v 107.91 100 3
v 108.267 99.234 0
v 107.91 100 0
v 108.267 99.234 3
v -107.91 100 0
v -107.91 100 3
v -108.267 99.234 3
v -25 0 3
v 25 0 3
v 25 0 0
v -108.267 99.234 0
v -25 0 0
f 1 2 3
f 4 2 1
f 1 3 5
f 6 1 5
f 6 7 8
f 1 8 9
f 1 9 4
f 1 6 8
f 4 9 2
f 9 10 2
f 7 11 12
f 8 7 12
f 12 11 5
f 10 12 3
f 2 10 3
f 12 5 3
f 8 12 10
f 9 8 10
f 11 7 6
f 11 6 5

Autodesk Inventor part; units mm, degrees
ref_plane "YZ Plane" through (0, 0, 0) normal (1, 0, 0) x (0, 1, 0)
ref_plane "XZ Plane" through (0, 0, 0) normal (0, 1, 0) x (-1, 0, 0)
ref_plane "XY Plane" through (0, 0, 0) normal (0, 0, 1) x (1, 0, 0)
sketch "Sketch1" plane through (0, 0, 0) normal (0, 0, 1) x (1, 0, 0)
  line L0 (-108.91, 100) -> (-25, 0)
  line L1 (-25, 0) -> (25, 0)
  line L2 (25, 0) -> (108.91, 100)
  line L3 (108.91, 100) -> (-108.91, 100)
  point P0 (0, 0)
  point P1 (0, 0)
  point P2 (0, 100)
  dimension "BendRadius" = 3
  dimension "d0" = 100
  dimension "d1" = 50
  dimension "d2" = 217.8199
  dimension "d4" = 130
extrude "Plate1" add sketch "Sketch1" along normal blind 3
chamfer "Chamfer1" distance 1 angle 45 2 edges at (-108.91, 100, 1.5) (108.91, 100, 1.5)
equation "\"BendRadius\" = Thickness"
equation "\"d0\" = Лоток_высота"
equation "\"d1\" = Лоток_ширина_низ"
equation "\"d4\" = Лоток_угол"
equation "\"d3\" = Thickness"
equation "\"BendReliefWidth\" = Thickness"
equation "\"BendReliefDepth\" = 0.5 * Thickness"
equation "\"CornerReliefSize\" = 4 * Thickness"
equation "\"MinimumRemnant\" = 2 * Thickness"
equation "\"TransitionRadius\" = BendRadius"
equation "\"JacobiRadiusSize\" = BendRadius"
equation "\"GapSize\" = Thickness"
equation "\"Thickness\" = 3"
equation "\"Лоток_высота\" = 100"
equation "\"Лоток_ширина_низ\" = 50"
equation "\"Лоток_угол\" = 130deg"
properties part number "ДМС 304 торец лотка кормовой"
